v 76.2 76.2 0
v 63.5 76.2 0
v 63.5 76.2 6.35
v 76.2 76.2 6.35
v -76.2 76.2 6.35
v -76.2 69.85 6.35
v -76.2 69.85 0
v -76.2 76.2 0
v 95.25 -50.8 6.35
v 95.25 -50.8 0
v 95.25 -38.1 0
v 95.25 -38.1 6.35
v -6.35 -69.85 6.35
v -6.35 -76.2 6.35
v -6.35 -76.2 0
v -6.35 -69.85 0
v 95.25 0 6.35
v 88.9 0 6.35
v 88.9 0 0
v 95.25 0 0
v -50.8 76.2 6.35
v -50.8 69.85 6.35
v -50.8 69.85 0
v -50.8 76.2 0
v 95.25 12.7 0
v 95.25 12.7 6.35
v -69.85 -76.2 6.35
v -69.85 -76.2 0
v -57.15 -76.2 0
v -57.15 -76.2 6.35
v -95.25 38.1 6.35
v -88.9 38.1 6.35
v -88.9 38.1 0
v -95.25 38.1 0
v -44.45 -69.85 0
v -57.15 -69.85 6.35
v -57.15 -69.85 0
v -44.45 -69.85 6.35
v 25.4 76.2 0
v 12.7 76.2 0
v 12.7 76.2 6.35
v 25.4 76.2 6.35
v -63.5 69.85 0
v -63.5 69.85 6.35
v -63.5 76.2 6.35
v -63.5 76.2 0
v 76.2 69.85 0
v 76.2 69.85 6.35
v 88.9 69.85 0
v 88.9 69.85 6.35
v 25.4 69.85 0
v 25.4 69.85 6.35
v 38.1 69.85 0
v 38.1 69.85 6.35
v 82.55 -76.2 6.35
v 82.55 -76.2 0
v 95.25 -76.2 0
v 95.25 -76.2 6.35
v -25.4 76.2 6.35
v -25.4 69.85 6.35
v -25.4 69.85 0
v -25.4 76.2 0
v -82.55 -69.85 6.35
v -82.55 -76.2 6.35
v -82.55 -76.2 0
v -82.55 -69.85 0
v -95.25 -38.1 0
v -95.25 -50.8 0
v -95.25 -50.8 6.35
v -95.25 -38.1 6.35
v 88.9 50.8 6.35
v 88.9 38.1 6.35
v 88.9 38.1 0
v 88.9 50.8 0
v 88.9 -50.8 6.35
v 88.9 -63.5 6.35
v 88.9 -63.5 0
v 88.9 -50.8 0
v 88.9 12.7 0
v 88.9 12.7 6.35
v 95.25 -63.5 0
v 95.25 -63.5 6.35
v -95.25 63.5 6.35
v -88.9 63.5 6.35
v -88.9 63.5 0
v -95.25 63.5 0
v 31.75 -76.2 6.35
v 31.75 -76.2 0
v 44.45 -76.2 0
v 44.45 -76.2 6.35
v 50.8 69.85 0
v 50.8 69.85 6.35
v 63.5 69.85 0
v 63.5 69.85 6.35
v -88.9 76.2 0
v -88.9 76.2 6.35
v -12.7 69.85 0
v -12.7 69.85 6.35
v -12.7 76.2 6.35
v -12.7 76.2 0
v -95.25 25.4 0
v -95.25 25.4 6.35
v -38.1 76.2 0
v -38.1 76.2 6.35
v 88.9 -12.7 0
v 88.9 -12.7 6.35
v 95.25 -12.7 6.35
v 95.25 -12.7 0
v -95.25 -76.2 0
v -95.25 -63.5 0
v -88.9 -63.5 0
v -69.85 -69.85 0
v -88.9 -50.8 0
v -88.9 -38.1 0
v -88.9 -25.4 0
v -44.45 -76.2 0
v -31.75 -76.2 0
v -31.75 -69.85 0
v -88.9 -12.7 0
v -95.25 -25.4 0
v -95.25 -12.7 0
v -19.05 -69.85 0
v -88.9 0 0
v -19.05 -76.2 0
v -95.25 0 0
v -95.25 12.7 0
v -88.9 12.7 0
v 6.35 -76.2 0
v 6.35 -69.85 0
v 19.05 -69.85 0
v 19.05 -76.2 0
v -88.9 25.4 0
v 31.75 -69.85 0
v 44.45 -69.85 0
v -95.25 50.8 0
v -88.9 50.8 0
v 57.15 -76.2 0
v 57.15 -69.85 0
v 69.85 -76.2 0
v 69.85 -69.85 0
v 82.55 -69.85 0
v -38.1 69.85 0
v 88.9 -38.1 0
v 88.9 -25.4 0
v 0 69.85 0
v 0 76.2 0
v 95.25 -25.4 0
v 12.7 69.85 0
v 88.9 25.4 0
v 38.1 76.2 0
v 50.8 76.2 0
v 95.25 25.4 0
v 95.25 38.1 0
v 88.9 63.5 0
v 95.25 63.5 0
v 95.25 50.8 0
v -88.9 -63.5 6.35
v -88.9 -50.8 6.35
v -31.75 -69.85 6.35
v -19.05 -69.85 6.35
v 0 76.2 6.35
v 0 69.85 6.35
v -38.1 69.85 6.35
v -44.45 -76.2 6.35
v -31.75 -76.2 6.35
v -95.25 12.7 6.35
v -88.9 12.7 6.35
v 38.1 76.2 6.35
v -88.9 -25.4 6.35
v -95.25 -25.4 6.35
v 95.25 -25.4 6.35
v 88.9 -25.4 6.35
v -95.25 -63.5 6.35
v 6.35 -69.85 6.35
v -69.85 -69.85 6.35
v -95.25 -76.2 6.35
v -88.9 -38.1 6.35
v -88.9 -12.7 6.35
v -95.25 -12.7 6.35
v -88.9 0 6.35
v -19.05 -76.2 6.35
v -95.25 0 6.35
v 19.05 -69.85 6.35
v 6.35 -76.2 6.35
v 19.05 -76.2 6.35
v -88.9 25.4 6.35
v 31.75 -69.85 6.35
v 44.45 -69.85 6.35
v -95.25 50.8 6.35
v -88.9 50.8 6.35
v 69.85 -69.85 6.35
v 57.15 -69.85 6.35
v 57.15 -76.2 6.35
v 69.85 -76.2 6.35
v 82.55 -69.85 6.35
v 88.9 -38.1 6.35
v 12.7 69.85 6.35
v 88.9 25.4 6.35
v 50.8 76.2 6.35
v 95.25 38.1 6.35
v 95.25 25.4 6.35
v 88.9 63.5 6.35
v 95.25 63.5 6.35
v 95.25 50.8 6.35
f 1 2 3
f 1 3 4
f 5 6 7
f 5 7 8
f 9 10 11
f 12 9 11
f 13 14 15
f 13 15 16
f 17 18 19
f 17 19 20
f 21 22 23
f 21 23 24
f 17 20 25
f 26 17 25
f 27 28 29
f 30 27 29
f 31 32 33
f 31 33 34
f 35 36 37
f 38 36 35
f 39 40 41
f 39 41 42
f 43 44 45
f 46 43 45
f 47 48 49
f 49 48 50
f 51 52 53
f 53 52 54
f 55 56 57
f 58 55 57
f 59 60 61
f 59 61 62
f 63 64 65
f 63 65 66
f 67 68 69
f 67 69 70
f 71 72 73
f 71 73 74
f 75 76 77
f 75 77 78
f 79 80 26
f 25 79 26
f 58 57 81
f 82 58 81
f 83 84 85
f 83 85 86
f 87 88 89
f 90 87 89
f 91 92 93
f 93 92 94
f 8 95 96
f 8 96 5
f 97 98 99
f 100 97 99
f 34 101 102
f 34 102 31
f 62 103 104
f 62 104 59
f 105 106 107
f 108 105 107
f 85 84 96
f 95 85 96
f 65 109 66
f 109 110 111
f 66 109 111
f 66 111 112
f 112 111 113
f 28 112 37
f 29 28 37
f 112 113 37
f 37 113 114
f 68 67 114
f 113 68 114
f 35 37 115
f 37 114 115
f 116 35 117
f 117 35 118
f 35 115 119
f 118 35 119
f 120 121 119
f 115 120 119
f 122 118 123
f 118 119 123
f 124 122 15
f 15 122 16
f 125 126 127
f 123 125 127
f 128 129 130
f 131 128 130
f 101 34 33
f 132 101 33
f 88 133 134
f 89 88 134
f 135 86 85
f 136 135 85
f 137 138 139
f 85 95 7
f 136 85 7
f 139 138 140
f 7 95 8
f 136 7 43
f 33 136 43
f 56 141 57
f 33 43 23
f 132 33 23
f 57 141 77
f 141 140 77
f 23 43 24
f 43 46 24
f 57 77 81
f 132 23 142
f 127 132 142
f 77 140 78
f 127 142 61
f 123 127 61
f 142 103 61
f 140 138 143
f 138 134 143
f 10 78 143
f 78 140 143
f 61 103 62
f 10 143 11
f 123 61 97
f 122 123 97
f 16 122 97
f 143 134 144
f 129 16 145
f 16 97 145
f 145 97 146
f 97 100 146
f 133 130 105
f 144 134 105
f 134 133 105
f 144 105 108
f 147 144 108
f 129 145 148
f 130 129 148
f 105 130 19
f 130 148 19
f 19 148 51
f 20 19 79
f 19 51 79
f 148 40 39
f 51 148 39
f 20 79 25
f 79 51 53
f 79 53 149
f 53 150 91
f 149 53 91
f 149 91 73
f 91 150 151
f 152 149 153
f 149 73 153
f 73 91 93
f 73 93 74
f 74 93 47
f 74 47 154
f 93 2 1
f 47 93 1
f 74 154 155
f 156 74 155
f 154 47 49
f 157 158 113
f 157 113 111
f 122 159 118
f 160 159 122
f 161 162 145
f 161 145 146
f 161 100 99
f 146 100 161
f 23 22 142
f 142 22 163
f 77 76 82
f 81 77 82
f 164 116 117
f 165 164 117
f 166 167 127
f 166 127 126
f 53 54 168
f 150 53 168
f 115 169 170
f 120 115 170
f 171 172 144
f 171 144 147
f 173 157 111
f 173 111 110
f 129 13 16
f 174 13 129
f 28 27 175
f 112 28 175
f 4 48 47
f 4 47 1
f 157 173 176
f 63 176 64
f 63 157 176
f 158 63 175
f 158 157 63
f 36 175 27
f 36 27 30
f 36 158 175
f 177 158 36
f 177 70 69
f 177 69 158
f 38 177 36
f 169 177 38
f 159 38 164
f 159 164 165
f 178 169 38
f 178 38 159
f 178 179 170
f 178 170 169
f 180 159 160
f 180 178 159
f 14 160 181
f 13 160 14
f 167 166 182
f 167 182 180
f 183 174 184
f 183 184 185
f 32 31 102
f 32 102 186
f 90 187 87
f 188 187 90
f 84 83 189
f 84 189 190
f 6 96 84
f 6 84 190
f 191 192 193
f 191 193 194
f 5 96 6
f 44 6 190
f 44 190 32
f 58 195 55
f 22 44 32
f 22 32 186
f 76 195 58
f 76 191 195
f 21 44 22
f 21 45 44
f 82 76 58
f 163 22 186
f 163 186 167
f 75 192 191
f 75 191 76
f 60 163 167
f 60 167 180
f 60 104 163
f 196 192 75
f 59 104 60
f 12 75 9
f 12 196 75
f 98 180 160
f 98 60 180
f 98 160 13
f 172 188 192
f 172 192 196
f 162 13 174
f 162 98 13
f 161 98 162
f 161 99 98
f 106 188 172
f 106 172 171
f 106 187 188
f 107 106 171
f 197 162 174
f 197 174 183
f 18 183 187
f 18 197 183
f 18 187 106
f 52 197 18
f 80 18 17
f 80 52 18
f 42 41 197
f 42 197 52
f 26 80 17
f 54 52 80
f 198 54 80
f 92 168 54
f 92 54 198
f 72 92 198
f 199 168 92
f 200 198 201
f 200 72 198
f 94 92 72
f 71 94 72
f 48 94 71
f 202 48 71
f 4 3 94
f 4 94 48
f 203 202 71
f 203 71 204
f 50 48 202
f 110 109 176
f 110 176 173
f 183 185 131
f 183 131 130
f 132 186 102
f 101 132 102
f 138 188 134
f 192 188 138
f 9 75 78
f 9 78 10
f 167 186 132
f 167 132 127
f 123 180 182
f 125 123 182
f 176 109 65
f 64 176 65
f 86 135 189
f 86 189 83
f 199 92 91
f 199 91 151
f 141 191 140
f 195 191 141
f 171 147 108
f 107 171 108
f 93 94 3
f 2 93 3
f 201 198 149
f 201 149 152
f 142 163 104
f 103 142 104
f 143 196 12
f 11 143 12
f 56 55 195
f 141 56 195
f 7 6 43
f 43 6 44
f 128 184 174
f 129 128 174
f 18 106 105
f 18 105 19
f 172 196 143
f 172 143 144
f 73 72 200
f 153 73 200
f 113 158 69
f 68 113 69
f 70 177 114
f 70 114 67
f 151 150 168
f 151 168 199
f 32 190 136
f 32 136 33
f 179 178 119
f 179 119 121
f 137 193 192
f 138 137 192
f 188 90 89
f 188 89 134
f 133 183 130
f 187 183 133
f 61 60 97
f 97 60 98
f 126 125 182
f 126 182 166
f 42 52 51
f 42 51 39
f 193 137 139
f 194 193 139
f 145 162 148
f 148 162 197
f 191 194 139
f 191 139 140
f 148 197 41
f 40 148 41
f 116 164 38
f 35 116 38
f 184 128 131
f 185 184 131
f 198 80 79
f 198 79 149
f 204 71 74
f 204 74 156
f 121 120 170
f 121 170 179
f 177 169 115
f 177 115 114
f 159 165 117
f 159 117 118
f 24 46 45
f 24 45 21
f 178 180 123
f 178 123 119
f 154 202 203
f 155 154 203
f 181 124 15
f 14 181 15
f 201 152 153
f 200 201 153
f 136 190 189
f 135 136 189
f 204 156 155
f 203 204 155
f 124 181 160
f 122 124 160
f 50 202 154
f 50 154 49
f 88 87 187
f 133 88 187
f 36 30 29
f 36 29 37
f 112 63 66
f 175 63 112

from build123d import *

# Parameters (mm, degrees)
SKETCH1_W               = 190.5
SKETCH1_H               = 152.4
BOSS_EXTRUDE1_DEPTH     = 6.35
SKETCH2_W               = 12.7
SKETCH2_H               = 6.35
CUT_EXTRUDE1_DEPTH      = 7.35
LPATTERN1_COUNT         = 7
LPATTERN1_PITCH         = 25.4
SKETCH3_W               = 6.35
SKETCH3_H               = 12.7
CUT_EXTRUDE2_DEPTH      = 7.35
LPATTERN2_COUNT         = 6
LPATTERN2_PITCH         = 25.4
MIRROR2_COPY_1_SKETCH_W = 6.35
MIRROR2_COPY_1_SKETCH_H = 12.7
MIRROR2_COPY_1_DEPTH    = 7.35
MIRROR2_COPY_2_SKETCH_W = 6.35
MIRROR2_COPY_2_SKETCH_H = 12.7
MIRROR2_COPY_2_DEPTH    = 7.35
MIRROR2_COPY_3_SKETCH_W = 6.35
MIRROR2_COPY_3_SKETCH_H = 12.7
MIRROR2_COPY_3_DEPTH    = 7.35
MIRROR2_COPY_4_SKETCH_W = 6.35
MIRROR2_COPY_4_SKETCH_H = 12.7
MIRROR2_COPY_4_DEPTH    = 7.35
MIRROR2_COPY_5_SKETCH_W = 6.35
MIRROR2_COPY_5_SKETCH_H = 12.7
MIRROR2_COPY_5_DEPTH    = 7.35
SKETCH4_W               = 12.7
SKETCH4_H               = 6.35
CUT_EXTRUDE3_DEPTH      = 7.35
LPATTERN3_COUNT         = 7
LPATTERN3_PITCH         = 25.4


with BuildPart() as part:
    # Sketch1 → Boss-Extrude1 (new body)
    with BuildSketch(Plane.XY):
        Rectangle(SKETCH1_W, SKETCH1_H)
    extrude(amount=BOSS_EXTRUDE1_DEPTH)

    # Sketch2 → Cut-Extrude1 (cut, through all)
    with BuildSketch(Plane.XY.offset(6.35)):
        with Locations((-69.85, 73.025)):
            Rectangle(SKETCH2_W, SKETCH2_H)
    cut_extrude1 = extrude(amount=-CUT_EXTRUDE1_DEPTH, mode=Mode.SUBTRACT)

    # LPattern1: Cut-Extrude1 ×7
    with Locations(*[(i * LPATTERN1_PITCH, 0, 0) for i in range(1, LPATTERN1_COUNT)]):
        add(cut_extrude1, mode=Mode.SUBTRACT)

    # Sketch3 → Cut-Extrude2 (cut, through all)
    with BuildSketch(Plane.XY.offset(6.35)):
        with Locations((92.075, 69.85)):
            Rectangle(SKETCH3_W, SKETCH3_H)
    cut_extrude2 = extrude(amount=-CUT_EXTRUDE2_DEPTH, mode=Mode.SUBTRACT)

    # LPattern2: Cut-Extrude2 ×6
    with Locations(*[(0, -i * LPATTERN2_PITCH, 0) for i in range(1, LPATTERN2_COUNT)]):
        add(cut_extrude2, mode=Mode.SUBTRACT)

    # Mirror2: Cut-Extrude2 across plane
    add(cut_extrude2.mirror(Plane(origin=(0, 0, 0), x_dir=(0, 0, 1), z_dir=(1, 0, 0))), mode=Mode.SUBTRACT)

    # Mirror2 copy 1 sketch → Mirror2 copy 1 (cut, through all)
    with BuildSketch(Plane(origin=(0, -25.4, 6.35), x_dir=(-1, 0, 0), z_dir=(0, 0, 1))):
        with Locations((92.075, -69.85)):
            Rectangle(MIRROR2_COPY_1_SKETCH_W, MIRROR2_COPY_1_SKETCH_H)
    extrude(amount=-MIRROR2_COPY_1_DEPTH, mode=Mode.SUBTRACT)

    # Mirror2 copy 2 sketch → Mirror2 copy 2 (cut, through all)
    with BuildSketch(Plane(origin=(0, -50.8, 6.35), x_dir=(-1, 0, 0), z_dir=(0, 0, 1))):
        with Locations((92.075, -69.85)):
            Rectangle(MIRROR2_COPY_2_SKETCH_W, MIRROR2_COPY_2_SKETCH_H)
    extrude(amount=-MIRROR2_COPY_2_DEPTH, mode=Mode.SUBTRACT)

    # Mirror2 copy 3 sketch → Mirror2 copy 3 (cut, through all)
    with BuildSketch(Plane(origin=(0, -76.2, 6.35), x_dir=(-1, 0, 0), z_dir=(0, 0, 1))):
        with Locations((92.075, -69.85)):
            Rectangle(MIRROR2_COPY_3_SKETCH_W, MIRROR2_COPY_3_SKETCH_H)
    extrude(amount=-MIRROR2_COPY_3_DEPTH, mode=Mode.SUBTRACT)

    # Mirror2 copy 4 sketch → Mirror2 copy 4 (cut, through all)
    with BuildSketch(Plane(origin=(0, -101.6, 6.35), x_dir=(-1, 0, 0), z_dir=(0, 0, 1))):
        with Locations((92.075, -69.85)):
            Rectangle(MIRROR2_COPY_4_SKETCH_W, MIRROR2_COPY_4_SKETCH_H)
    extrude(amount=-MIRROR2_COPY_4_DEPTH, mode=Mode.SUBTRACT)

    # Mirror2 copy 5 sketch → Mirror2 copy 5 (cut, through all)
    with BuildSketch(Plane(origin=(0, -127, 6.35), x_dir=(-1, 0, 0), z_dir=(0, 0, 1))):
        with Locations((92.075, -69.85)):
            Rectangle(MIRROR2_COPY_5_SKETCH_W, MIRROR2_COPY_5_SKETCH_H)
    extrude(amount=-MIRROR2_COPY_5_DEPTH, mode=Mode.SUBTRACT)

    # Sketch4 → Cut-Extrude3 (cut, through all)
    with BuildSketch(Plane.XY.offset(6.35)):
        with Locations((-76.2, -73.025)):
            Rectangle(SKETCH4_W, SKETCH4_H)
    cut_extrude3 = extrude(amount=-CUT_EXTRUDE3_DEPTH, mode=Mode.SUBTRACT)

    # LPattern3: Cut-Extrude3 ×7
    with Locations(*[(i * LPATTERN3_PITCH, 0, 0) for i in range(1, LPATTERN3_COUNT)]):
        add(cut_extrude3, mode=Mode.SUBTRACT)


solid = part.part
